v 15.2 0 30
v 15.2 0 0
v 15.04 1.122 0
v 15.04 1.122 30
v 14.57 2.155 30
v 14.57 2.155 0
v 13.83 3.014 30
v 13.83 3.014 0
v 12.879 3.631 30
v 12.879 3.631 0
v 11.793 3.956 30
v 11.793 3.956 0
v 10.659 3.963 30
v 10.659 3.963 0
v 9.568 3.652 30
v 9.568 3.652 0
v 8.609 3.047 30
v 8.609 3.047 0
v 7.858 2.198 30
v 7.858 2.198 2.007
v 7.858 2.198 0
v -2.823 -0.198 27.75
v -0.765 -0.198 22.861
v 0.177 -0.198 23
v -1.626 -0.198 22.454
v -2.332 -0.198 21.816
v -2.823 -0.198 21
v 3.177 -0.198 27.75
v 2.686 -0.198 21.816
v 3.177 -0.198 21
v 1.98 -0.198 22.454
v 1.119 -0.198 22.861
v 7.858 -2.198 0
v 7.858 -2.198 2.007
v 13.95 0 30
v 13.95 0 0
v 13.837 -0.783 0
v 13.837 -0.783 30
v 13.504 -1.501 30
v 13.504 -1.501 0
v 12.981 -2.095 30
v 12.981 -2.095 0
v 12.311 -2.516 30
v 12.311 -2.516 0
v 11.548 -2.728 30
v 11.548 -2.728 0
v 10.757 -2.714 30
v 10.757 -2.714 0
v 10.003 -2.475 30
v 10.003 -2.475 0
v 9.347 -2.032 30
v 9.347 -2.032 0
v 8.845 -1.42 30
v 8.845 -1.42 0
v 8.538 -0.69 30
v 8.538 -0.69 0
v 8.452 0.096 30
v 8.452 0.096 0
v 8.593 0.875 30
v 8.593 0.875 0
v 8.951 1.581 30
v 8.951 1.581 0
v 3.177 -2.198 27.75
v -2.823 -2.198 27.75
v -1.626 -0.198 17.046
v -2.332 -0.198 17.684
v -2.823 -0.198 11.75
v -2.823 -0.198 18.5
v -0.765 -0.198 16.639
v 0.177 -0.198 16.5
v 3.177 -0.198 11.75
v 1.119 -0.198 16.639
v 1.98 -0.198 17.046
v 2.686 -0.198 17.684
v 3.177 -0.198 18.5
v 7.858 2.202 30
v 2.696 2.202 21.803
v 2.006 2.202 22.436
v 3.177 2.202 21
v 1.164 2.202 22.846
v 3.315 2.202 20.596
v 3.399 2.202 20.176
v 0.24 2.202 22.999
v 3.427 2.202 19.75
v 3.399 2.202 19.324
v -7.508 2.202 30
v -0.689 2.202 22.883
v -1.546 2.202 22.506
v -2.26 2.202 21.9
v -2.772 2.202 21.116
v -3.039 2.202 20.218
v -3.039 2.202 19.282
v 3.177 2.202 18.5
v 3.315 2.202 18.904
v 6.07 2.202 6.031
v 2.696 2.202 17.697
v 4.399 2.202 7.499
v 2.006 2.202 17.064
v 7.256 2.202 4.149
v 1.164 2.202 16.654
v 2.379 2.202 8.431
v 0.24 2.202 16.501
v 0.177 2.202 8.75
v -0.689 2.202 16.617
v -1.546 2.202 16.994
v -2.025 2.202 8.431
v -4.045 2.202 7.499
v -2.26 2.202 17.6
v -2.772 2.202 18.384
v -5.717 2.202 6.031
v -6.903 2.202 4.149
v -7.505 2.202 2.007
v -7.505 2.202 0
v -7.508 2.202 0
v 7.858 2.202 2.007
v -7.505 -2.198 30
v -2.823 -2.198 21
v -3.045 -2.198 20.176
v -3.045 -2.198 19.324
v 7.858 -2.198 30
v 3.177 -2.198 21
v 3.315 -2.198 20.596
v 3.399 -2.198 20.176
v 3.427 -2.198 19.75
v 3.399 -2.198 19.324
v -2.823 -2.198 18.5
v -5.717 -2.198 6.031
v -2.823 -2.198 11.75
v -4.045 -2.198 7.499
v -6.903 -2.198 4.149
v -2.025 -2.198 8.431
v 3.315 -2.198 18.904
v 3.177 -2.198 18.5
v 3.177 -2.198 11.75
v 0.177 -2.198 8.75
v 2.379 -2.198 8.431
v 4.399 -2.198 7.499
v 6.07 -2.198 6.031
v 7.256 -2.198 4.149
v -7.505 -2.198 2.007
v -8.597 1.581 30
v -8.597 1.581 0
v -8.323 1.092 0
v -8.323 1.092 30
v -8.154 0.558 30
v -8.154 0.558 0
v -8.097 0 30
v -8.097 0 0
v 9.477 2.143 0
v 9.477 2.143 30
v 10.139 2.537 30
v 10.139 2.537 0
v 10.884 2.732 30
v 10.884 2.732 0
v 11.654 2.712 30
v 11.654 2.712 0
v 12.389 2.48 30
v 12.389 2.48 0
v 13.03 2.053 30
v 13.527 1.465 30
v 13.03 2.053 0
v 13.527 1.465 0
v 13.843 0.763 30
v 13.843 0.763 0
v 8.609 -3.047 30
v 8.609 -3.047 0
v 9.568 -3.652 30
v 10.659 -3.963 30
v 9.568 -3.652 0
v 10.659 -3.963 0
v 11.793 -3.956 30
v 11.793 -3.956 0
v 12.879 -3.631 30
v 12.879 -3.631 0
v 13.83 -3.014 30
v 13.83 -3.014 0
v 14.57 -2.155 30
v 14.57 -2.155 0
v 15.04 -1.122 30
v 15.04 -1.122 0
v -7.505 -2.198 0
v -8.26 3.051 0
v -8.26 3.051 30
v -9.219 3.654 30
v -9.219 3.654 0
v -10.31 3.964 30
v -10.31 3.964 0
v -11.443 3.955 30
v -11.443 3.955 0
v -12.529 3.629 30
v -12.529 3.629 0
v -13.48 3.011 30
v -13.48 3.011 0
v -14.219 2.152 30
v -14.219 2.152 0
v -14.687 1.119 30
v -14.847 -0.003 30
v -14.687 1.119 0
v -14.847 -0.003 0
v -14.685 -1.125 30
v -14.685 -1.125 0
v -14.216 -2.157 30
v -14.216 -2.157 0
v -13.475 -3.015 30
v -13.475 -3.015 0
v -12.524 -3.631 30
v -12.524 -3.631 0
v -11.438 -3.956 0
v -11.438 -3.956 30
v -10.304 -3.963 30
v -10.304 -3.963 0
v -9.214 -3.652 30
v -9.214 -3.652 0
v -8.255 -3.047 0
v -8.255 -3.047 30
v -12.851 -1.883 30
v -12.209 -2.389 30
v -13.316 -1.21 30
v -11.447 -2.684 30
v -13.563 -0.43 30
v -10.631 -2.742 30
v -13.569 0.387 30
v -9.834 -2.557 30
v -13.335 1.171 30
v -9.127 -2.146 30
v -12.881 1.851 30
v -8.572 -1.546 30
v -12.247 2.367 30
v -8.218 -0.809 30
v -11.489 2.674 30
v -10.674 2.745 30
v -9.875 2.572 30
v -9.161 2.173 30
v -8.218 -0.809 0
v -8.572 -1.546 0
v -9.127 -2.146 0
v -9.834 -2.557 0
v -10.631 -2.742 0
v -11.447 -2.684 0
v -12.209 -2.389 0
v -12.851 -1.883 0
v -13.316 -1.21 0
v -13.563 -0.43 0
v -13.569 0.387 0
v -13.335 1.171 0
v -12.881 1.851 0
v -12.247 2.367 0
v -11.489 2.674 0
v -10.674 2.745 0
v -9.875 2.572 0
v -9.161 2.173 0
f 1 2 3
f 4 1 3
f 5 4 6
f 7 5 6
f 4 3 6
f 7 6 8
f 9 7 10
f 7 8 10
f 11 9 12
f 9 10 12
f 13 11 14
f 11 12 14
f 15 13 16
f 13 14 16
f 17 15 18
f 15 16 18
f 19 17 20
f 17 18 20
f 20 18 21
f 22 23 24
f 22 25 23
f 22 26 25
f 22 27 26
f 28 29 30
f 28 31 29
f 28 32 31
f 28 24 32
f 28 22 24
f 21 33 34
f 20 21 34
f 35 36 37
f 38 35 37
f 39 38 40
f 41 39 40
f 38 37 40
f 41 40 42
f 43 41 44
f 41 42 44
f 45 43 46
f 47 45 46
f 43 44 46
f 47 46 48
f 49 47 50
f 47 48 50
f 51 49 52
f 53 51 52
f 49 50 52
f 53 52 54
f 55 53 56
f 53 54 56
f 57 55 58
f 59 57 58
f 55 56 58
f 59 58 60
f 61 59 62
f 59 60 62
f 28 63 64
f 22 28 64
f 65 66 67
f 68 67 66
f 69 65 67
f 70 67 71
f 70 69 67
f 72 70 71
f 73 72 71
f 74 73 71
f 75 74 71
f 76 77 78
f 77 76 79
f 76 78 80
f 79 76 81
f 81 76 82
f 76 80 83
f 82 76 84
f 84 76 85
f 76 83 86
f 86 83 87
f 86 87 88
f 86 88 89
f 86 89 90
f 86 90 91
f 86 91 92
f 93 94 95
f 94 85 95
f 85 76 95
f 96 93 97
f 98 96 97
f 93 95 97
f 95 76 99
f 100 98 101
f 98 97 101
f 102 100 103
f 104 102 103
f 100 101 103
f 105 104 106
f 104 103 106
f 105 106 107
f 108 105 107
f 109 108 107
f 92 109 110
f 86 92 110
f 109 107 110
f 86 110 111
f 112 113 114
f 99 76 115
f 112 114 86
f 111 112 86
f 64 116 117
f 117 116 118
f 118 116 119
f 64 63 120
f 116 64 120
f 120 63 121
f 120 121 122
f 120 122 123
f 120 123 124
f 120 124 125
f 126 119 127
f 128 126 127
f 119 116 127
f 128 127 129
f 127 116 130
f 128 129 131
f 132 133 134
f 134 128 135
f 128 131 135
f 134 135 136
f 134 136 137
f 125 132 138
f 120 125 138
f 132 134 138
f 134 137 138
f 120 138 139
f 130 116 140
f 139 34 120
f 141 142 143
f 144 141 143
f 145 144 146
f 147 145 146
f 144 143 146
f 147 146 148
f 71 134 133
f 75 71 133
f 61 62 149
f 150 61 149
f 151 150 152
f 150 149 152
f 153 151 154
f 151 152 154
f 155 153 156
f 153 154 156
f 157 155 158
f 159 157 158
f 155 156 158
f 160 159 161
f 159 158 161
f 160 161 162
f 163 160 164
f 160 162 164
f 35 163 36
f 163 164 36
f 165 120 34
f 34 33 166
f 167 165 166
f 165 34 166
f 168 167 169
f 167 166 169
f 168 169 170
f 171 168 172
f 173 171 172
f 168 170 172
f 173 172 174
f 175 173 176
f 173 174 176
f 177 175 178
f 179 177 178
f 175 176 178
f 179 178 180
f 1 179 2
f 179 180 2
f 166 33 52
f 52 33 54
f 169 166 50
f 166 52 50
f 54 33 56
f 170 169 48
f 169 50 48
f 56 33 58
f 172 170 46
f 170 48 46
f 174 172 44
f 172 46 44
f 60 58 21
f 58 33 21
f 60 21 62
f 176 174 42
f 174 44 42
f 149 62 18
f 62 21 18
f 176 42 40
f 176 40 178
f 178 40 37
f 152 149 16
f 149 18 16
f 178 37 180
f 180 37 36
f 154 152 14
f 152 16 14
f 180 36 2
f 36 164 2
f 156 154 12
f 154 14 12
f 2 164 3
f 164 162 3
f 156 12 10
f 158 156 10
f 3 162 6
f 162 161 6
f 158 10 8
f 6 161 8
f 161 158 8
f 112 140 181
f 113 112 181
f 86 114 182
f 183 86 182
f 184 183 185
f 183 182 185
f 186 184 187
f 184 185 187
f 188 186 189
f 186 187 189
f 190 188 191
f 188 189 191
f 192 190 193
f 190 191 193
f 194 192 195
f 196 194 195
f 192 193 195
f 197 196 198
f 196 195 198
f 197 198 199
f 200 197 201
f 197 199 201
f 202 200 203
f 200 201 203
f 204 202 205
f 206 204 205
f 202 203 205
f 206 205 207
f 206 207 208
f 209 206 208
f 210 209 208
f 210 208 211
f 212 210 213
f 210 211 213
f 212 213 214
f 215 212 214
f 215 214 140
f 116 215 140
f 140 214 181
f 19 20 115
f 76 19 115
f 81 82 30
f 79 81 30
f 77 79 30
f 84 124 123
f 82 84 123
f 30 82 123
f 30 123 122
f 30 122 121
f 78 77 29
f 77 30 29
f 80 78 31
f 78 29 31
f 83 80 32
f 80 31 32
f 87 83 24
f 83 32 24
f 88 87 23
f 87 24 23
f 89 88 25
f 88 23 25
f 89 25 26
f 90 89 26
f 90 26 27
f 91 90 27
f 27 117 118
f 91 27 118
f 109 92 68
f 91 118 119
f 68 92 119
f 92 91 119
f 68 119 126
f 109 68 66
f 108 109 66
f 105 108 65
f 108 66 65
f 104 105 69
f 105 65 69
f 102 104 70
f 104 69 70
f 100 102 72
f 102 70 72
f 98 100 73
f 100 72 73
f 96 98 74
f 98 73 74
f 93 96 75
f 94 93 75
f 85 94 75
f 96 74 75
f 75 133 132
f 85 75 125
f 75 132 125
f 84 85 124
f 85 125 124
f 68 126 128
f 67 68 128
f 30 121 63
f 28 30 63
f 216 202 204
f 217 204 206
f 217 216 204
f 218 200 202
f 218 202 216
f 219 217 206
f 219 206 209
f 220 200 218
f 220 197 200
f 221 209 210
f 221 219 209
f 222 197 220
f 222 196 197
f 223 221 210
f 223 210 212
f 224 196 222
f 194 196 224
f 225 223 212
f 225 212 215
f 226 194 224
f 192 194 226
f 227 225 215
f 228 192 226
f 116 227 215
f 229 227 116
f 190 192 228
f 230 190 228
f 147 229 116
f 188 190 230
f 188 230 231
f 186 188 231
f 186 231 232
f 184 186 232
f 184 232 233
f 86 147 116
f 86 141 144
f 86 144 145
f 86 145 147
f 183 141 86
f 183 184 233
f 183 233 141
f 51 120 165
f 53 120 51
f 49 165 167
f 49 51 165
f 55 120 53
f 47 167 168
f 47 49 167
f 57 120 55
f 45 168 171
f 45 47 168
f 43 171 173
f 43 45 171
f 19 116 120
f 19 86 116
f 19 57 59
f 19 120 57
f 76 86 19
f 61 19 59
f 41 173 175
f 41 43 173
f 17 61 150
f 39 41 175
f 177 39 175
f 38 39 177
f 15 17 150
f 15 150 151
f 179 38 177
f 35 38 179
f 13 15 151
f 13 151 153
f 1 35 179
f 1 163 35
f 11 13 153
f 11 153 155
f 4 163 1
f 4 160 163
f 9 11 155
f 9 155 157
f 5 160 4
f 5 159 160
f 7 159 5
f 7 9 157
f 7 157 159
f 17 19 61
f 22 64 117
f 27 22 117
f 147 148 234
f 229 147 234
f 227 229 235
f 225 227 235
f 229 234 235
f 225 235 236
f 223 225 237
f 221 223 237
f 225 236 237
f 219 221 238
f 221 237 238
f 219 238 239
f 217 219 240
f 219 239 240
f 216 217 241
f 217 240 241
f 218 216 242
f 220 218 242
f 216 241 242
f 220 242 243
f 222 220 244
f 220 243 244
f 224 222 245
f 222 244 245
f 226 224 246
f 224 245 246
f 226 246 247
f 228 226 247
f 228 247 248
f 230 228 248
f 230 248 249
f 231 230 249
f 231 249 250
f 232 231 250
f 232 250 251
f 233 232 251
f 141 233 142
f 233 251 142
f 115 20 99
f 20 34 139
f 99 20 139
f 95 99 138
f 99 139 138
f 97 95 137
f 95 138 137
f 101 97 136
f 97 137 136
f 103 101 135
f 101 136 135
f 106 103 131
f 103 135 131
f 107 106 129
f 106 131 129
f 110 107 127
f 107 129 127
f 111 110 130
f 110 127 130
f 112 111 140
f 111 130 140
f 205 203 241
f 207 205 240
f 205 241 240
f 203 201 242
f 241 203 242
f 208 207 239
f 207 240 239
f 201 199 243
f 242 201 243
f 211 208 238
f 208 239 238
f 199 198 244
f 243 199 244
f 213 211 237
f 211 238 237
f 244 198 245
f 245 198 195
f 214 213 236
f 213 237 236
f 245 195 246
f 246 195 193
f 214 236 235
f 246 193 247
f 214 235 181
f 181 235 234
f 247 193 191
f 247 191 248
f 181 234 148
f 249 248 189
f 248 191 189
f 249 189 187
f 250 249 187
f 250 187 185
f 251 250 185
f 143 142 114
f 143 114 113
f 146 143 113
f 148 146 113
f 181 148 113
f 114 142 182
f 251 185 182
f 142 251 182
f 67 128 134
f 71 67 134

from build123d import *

# Parameters (mm, degrees)
F1_DEPTH = 30
F3_DEPTH = 4.4
F4_DEPTH = 2
F5_DEPTH = 2.4
F7_DEPTH = 4.4


with BuildPart() as f1:
    # F0 (on Top) → F1 (new body)
    with BuildSketch(Plane.XY):
        with BuildLine():
            Line((7.8582108495, 2.1976148234), (7.8582108495, 1.5812813318))
            Line((7.8582108495, 1.5812813318), (7.8582108495, -2.1976148234))
            ThreePointArc((7.8582108495, -2.1976148234), (12.3474105352, -3.8320303136), (15.2004390117, 0))
            ThreePointArc((15.2004390117, 0), (12.3474105352, 3.8320303136), (7.8582108495, 2.1976148234))
        make_face()
        with BuildLine():
            ThreePointArc((8.9505391584, 1.5812813318), (12.0296782424, 2.6219958616), (13.9504390117, 0))
            ThreePointArc((13.9504390117, 0), (10.3711997809, -2.6219958616), (8.9505391584, 1.5812813318))
        make_face(mode=Mode.SUBTRACT)
        with BuildLine():
            Line((7.8582108495, -2.1976148234), (7.8582108495, 1.5812813318))
            Line((7.8582108495, 1.5812813318), (7.5262657237, 1.5812813318))
            ThreePointArc((7.5262657237, 1.5812813318), (7.2157826444, -0.3500194778), (7.8582108495, -2.1976148234))
        make_face()
        with BuildLine():
            Line((7.5262657237, 1.5812813318), (7.8582108495, 1.5812813318))
            Line((7.8582108495, 1.5812813318), (7.8582108495, 2.1976148234))
            ThreePointArc((7.8582108495, 2.1976148234), (7.6787293316, 1.8967237357), (7.5262657237, 1.5812813318))
        make_face()
        with BuildLine():
            ThreePointArc((7.8582108495, -2.1976148234), (7.2157826444, -0.3500194778), (7.5262657237, 1.5812813318))
            Line((7.5262657237, 1.5812813318), (-7.1725568309, 1.5812813318))
            ThreePointArc((-7.1725568309, 1.5812813318), (-6.9290335283, 0.8072505337), (-6.8467301189, 0))
            ThreePointArc((-6.8467301189, 0), (-7.0146998053, -1.1469715235), (-7.5045019567, -2.1976148234))
            Line((-7.5045019567, -2.1976148234), (7.8582108495, -2.1976148234))
        make_face()
        with BuildLine():
            Line((-7.1725568309, 1.5812813318), (7.5262657237, 1.5812813318))
            ThreePointArc((7.5262657237, 1.5812813318), (7.6787293316, 1.8967237357), (7.8582108495, 2.1976148234))
            Line((7.8582108495, 2.1976148234), (7.8582108495, 2.2023851766))
            Line((7.8582108495, 2.2023851766), (-7.5076434872, 2.2023851766))
            ThreePointArc((-7.5076434872, 2.2023851766), (-7.3263755669, 1.8992376967), (-7.1725568309, 1.5812813318))
        make_face()
        with BuildLine():
            ThreePointArc((-6.8467301189, 0), (-6.9290335283, 0.8072505337), (-7.1725568309, 1.5812813318))
            Line((-7.1725568309, 1.5812813318), (-7.5076434872, 1.5812813318))
            Line((-7.5076434872, 1.5812813318), (-7.5076434872, -2.1976148234))
            Line((-7.5076434872, -2.1976148234), (-7.5045019567, -2.1976148234))
            ThreePointArc((-7.5045019567, -2.1976148234), (-7.0146998053, -1.1469715235), (-6.8467301189, 0))
        make_face()
        with BuildLine():
            Line((-7.5076434872, 1.5812813318), (-7.1725568309, 1.5812813318))
            ThreePointArc((-7.1725568309, 1.5812813318), (-7.3263755669, 1.8992376967), (-7.5076434872, 2.2023851766))
            Line((-7.5076434872, 2.2023851766), (-7.5076434872, 1.5812813318))
        make_face()
        with BuildLine():
            ThreePointArc((-7.5076434872, 2.2023851766), (-14.8467290993, -0.0028559361), (-7.5045019567, -2.1976148234))
            Line((-7.5045019567, -2.1976148234), (-7.5076434872, -2.1976148234))
            Line((-7.5076434872, -2.1976148234), (-7.5076434872, 1.5812813318))
            Line((-7.5076434872, 1.5812813318), (-7.5076434872, 2.2023851766))
        make_face()
        with BuildLine():
            ThreePointArc((-8.0967301189, 0), (-13.4687259805, -0.8292392307), (-8.5968302656, 1.5812813318))
            ThreePointArc((-8.5968302656, 1.5812813318), (-8.2247342573, 0.8292392307), (-8.0967301189, 0))
        make_face(mode=Mode.SUBTRACT)
    extrude(amount=F1_DEPTH)

    # F2 (on face) → F3 (cut, through all)
    with BuildSketch(Plane.XZ.offset(2.1976148234)):
        with BuildLine():
            Line((3.1768544464, 18.5), (3.1768544464, 21))
            ThreePointArc((3.1768544464, 21), (0.1768544464, 23), (-2.8231455536, 21))
            Line((-2.8231455536, 21), (-2.8231455536, 18.5))
            ThreePointArc((-2.8231455536, 18.5), (0.1768544464, 16.5), (3.1768544464, 18.5))
        make_face()
    extrude(amount=-F3_DEPTH, mode=Mode.SUBTRACT)

    # F2 (on face) → F4 (cut)
    with BuildSketch(Plane.XZ.offset(2.1976148234)):
        with BuildLine():
            ThreePointArc((3.1768544464, 18.5), (3.3637416424, 19.1126225608), (3.4268544464, 19.75))
            ThreePointArc((3.4268544464, 19.75), (3.3637416424, 20.3873774392), (3.1768544464, 21))
            Line((3.1768544464, 21), (3.1768544464, 18.5))
        make_face()
        with BuildLine():
            Line((3.1768544464, 18.5), (3.1768544464, 21))
            ThreePointArc((3.1768544464, 21), (0.1768544464, 23), (-2.8231455536, 21))
            Line((-2.8231455536, 21), (-2.8231455536, 18.5))
            ThreePointArc((-2.8231455536, 18.5), (0.1768544464, 16.5), (3.1768544464, 18.5))
        make_face()
        with BuildLine():
            ThreePointArc((-2.8231455536, 21), (0.1768544464, 23), (3.1768544464, 21))
            Line((3.1768544464, 21), (3.1768544464, 27.75))
            Line((3.1768544464, 27.75), (-2.8231455536, 27.75))
            Line((-2.8231455536, 27.75), (-2.8231455536, 21))
        make_face()
        with BuildLine():
            Line((3.1768544464, 11.75), (3.1768544464, 18.5))
            ThreePointArc((3.1768544464, 18.5), (0.1768544464, 16.5), (-2.8231455536, 18.5))
            Line((-2.8231455536, 18.5), (-2.8231455536, 11.75))
            Line((-2.8231455536, 11.75), (3.1768544464, 11.75))
        make_face()
        with BuildLine():
            Line((-2.8231455536, 18.5), (-2.8231455536, 21))
            ThreePointArc((-2.8231455536, 21), (-3.0731455536, 19.75), (-2.8231455536, 18.5))
        make_face()
    extrude(amount=-F4_DEPTH, mode=Mode.SUBTRACT)

    # F5 (cut, through all): faces of the model
    f5_faces = [f1.faces().sort_by_distance(p)[0] for p in [
        (-2.9234827298, -0.1976148234, 19.75),
        (3.2771916226, -0.1976148234, 19.75),
    ]]
    extrude(f5_faces, amount=-F5_DEPTH, mode=Mode.SUBTRACT)

    # F6 (on face) → F7 (cut, through all)
    with BuildSketch(Plane.XZ.offset(2.1976148234)):
        with BuildLine():
            Line((-7.5045019567, 0), (7.8582108495, 0))
            Line((7.8582108495, 0), (7.8582108495, 2.0067730067))
            ThreePointArc((7.8582108495, 2.0067730067), (0.1768544464, 8.75), (-7.5045019567, 2.0067730067))
            Line((-7.5045019567, 2.0067730067), (-7.5045019567, 0))
        make_face()
    extrude(amount=-F7_DEPTH, mode=Mode.SUBTRACT)


solid = f1.part
